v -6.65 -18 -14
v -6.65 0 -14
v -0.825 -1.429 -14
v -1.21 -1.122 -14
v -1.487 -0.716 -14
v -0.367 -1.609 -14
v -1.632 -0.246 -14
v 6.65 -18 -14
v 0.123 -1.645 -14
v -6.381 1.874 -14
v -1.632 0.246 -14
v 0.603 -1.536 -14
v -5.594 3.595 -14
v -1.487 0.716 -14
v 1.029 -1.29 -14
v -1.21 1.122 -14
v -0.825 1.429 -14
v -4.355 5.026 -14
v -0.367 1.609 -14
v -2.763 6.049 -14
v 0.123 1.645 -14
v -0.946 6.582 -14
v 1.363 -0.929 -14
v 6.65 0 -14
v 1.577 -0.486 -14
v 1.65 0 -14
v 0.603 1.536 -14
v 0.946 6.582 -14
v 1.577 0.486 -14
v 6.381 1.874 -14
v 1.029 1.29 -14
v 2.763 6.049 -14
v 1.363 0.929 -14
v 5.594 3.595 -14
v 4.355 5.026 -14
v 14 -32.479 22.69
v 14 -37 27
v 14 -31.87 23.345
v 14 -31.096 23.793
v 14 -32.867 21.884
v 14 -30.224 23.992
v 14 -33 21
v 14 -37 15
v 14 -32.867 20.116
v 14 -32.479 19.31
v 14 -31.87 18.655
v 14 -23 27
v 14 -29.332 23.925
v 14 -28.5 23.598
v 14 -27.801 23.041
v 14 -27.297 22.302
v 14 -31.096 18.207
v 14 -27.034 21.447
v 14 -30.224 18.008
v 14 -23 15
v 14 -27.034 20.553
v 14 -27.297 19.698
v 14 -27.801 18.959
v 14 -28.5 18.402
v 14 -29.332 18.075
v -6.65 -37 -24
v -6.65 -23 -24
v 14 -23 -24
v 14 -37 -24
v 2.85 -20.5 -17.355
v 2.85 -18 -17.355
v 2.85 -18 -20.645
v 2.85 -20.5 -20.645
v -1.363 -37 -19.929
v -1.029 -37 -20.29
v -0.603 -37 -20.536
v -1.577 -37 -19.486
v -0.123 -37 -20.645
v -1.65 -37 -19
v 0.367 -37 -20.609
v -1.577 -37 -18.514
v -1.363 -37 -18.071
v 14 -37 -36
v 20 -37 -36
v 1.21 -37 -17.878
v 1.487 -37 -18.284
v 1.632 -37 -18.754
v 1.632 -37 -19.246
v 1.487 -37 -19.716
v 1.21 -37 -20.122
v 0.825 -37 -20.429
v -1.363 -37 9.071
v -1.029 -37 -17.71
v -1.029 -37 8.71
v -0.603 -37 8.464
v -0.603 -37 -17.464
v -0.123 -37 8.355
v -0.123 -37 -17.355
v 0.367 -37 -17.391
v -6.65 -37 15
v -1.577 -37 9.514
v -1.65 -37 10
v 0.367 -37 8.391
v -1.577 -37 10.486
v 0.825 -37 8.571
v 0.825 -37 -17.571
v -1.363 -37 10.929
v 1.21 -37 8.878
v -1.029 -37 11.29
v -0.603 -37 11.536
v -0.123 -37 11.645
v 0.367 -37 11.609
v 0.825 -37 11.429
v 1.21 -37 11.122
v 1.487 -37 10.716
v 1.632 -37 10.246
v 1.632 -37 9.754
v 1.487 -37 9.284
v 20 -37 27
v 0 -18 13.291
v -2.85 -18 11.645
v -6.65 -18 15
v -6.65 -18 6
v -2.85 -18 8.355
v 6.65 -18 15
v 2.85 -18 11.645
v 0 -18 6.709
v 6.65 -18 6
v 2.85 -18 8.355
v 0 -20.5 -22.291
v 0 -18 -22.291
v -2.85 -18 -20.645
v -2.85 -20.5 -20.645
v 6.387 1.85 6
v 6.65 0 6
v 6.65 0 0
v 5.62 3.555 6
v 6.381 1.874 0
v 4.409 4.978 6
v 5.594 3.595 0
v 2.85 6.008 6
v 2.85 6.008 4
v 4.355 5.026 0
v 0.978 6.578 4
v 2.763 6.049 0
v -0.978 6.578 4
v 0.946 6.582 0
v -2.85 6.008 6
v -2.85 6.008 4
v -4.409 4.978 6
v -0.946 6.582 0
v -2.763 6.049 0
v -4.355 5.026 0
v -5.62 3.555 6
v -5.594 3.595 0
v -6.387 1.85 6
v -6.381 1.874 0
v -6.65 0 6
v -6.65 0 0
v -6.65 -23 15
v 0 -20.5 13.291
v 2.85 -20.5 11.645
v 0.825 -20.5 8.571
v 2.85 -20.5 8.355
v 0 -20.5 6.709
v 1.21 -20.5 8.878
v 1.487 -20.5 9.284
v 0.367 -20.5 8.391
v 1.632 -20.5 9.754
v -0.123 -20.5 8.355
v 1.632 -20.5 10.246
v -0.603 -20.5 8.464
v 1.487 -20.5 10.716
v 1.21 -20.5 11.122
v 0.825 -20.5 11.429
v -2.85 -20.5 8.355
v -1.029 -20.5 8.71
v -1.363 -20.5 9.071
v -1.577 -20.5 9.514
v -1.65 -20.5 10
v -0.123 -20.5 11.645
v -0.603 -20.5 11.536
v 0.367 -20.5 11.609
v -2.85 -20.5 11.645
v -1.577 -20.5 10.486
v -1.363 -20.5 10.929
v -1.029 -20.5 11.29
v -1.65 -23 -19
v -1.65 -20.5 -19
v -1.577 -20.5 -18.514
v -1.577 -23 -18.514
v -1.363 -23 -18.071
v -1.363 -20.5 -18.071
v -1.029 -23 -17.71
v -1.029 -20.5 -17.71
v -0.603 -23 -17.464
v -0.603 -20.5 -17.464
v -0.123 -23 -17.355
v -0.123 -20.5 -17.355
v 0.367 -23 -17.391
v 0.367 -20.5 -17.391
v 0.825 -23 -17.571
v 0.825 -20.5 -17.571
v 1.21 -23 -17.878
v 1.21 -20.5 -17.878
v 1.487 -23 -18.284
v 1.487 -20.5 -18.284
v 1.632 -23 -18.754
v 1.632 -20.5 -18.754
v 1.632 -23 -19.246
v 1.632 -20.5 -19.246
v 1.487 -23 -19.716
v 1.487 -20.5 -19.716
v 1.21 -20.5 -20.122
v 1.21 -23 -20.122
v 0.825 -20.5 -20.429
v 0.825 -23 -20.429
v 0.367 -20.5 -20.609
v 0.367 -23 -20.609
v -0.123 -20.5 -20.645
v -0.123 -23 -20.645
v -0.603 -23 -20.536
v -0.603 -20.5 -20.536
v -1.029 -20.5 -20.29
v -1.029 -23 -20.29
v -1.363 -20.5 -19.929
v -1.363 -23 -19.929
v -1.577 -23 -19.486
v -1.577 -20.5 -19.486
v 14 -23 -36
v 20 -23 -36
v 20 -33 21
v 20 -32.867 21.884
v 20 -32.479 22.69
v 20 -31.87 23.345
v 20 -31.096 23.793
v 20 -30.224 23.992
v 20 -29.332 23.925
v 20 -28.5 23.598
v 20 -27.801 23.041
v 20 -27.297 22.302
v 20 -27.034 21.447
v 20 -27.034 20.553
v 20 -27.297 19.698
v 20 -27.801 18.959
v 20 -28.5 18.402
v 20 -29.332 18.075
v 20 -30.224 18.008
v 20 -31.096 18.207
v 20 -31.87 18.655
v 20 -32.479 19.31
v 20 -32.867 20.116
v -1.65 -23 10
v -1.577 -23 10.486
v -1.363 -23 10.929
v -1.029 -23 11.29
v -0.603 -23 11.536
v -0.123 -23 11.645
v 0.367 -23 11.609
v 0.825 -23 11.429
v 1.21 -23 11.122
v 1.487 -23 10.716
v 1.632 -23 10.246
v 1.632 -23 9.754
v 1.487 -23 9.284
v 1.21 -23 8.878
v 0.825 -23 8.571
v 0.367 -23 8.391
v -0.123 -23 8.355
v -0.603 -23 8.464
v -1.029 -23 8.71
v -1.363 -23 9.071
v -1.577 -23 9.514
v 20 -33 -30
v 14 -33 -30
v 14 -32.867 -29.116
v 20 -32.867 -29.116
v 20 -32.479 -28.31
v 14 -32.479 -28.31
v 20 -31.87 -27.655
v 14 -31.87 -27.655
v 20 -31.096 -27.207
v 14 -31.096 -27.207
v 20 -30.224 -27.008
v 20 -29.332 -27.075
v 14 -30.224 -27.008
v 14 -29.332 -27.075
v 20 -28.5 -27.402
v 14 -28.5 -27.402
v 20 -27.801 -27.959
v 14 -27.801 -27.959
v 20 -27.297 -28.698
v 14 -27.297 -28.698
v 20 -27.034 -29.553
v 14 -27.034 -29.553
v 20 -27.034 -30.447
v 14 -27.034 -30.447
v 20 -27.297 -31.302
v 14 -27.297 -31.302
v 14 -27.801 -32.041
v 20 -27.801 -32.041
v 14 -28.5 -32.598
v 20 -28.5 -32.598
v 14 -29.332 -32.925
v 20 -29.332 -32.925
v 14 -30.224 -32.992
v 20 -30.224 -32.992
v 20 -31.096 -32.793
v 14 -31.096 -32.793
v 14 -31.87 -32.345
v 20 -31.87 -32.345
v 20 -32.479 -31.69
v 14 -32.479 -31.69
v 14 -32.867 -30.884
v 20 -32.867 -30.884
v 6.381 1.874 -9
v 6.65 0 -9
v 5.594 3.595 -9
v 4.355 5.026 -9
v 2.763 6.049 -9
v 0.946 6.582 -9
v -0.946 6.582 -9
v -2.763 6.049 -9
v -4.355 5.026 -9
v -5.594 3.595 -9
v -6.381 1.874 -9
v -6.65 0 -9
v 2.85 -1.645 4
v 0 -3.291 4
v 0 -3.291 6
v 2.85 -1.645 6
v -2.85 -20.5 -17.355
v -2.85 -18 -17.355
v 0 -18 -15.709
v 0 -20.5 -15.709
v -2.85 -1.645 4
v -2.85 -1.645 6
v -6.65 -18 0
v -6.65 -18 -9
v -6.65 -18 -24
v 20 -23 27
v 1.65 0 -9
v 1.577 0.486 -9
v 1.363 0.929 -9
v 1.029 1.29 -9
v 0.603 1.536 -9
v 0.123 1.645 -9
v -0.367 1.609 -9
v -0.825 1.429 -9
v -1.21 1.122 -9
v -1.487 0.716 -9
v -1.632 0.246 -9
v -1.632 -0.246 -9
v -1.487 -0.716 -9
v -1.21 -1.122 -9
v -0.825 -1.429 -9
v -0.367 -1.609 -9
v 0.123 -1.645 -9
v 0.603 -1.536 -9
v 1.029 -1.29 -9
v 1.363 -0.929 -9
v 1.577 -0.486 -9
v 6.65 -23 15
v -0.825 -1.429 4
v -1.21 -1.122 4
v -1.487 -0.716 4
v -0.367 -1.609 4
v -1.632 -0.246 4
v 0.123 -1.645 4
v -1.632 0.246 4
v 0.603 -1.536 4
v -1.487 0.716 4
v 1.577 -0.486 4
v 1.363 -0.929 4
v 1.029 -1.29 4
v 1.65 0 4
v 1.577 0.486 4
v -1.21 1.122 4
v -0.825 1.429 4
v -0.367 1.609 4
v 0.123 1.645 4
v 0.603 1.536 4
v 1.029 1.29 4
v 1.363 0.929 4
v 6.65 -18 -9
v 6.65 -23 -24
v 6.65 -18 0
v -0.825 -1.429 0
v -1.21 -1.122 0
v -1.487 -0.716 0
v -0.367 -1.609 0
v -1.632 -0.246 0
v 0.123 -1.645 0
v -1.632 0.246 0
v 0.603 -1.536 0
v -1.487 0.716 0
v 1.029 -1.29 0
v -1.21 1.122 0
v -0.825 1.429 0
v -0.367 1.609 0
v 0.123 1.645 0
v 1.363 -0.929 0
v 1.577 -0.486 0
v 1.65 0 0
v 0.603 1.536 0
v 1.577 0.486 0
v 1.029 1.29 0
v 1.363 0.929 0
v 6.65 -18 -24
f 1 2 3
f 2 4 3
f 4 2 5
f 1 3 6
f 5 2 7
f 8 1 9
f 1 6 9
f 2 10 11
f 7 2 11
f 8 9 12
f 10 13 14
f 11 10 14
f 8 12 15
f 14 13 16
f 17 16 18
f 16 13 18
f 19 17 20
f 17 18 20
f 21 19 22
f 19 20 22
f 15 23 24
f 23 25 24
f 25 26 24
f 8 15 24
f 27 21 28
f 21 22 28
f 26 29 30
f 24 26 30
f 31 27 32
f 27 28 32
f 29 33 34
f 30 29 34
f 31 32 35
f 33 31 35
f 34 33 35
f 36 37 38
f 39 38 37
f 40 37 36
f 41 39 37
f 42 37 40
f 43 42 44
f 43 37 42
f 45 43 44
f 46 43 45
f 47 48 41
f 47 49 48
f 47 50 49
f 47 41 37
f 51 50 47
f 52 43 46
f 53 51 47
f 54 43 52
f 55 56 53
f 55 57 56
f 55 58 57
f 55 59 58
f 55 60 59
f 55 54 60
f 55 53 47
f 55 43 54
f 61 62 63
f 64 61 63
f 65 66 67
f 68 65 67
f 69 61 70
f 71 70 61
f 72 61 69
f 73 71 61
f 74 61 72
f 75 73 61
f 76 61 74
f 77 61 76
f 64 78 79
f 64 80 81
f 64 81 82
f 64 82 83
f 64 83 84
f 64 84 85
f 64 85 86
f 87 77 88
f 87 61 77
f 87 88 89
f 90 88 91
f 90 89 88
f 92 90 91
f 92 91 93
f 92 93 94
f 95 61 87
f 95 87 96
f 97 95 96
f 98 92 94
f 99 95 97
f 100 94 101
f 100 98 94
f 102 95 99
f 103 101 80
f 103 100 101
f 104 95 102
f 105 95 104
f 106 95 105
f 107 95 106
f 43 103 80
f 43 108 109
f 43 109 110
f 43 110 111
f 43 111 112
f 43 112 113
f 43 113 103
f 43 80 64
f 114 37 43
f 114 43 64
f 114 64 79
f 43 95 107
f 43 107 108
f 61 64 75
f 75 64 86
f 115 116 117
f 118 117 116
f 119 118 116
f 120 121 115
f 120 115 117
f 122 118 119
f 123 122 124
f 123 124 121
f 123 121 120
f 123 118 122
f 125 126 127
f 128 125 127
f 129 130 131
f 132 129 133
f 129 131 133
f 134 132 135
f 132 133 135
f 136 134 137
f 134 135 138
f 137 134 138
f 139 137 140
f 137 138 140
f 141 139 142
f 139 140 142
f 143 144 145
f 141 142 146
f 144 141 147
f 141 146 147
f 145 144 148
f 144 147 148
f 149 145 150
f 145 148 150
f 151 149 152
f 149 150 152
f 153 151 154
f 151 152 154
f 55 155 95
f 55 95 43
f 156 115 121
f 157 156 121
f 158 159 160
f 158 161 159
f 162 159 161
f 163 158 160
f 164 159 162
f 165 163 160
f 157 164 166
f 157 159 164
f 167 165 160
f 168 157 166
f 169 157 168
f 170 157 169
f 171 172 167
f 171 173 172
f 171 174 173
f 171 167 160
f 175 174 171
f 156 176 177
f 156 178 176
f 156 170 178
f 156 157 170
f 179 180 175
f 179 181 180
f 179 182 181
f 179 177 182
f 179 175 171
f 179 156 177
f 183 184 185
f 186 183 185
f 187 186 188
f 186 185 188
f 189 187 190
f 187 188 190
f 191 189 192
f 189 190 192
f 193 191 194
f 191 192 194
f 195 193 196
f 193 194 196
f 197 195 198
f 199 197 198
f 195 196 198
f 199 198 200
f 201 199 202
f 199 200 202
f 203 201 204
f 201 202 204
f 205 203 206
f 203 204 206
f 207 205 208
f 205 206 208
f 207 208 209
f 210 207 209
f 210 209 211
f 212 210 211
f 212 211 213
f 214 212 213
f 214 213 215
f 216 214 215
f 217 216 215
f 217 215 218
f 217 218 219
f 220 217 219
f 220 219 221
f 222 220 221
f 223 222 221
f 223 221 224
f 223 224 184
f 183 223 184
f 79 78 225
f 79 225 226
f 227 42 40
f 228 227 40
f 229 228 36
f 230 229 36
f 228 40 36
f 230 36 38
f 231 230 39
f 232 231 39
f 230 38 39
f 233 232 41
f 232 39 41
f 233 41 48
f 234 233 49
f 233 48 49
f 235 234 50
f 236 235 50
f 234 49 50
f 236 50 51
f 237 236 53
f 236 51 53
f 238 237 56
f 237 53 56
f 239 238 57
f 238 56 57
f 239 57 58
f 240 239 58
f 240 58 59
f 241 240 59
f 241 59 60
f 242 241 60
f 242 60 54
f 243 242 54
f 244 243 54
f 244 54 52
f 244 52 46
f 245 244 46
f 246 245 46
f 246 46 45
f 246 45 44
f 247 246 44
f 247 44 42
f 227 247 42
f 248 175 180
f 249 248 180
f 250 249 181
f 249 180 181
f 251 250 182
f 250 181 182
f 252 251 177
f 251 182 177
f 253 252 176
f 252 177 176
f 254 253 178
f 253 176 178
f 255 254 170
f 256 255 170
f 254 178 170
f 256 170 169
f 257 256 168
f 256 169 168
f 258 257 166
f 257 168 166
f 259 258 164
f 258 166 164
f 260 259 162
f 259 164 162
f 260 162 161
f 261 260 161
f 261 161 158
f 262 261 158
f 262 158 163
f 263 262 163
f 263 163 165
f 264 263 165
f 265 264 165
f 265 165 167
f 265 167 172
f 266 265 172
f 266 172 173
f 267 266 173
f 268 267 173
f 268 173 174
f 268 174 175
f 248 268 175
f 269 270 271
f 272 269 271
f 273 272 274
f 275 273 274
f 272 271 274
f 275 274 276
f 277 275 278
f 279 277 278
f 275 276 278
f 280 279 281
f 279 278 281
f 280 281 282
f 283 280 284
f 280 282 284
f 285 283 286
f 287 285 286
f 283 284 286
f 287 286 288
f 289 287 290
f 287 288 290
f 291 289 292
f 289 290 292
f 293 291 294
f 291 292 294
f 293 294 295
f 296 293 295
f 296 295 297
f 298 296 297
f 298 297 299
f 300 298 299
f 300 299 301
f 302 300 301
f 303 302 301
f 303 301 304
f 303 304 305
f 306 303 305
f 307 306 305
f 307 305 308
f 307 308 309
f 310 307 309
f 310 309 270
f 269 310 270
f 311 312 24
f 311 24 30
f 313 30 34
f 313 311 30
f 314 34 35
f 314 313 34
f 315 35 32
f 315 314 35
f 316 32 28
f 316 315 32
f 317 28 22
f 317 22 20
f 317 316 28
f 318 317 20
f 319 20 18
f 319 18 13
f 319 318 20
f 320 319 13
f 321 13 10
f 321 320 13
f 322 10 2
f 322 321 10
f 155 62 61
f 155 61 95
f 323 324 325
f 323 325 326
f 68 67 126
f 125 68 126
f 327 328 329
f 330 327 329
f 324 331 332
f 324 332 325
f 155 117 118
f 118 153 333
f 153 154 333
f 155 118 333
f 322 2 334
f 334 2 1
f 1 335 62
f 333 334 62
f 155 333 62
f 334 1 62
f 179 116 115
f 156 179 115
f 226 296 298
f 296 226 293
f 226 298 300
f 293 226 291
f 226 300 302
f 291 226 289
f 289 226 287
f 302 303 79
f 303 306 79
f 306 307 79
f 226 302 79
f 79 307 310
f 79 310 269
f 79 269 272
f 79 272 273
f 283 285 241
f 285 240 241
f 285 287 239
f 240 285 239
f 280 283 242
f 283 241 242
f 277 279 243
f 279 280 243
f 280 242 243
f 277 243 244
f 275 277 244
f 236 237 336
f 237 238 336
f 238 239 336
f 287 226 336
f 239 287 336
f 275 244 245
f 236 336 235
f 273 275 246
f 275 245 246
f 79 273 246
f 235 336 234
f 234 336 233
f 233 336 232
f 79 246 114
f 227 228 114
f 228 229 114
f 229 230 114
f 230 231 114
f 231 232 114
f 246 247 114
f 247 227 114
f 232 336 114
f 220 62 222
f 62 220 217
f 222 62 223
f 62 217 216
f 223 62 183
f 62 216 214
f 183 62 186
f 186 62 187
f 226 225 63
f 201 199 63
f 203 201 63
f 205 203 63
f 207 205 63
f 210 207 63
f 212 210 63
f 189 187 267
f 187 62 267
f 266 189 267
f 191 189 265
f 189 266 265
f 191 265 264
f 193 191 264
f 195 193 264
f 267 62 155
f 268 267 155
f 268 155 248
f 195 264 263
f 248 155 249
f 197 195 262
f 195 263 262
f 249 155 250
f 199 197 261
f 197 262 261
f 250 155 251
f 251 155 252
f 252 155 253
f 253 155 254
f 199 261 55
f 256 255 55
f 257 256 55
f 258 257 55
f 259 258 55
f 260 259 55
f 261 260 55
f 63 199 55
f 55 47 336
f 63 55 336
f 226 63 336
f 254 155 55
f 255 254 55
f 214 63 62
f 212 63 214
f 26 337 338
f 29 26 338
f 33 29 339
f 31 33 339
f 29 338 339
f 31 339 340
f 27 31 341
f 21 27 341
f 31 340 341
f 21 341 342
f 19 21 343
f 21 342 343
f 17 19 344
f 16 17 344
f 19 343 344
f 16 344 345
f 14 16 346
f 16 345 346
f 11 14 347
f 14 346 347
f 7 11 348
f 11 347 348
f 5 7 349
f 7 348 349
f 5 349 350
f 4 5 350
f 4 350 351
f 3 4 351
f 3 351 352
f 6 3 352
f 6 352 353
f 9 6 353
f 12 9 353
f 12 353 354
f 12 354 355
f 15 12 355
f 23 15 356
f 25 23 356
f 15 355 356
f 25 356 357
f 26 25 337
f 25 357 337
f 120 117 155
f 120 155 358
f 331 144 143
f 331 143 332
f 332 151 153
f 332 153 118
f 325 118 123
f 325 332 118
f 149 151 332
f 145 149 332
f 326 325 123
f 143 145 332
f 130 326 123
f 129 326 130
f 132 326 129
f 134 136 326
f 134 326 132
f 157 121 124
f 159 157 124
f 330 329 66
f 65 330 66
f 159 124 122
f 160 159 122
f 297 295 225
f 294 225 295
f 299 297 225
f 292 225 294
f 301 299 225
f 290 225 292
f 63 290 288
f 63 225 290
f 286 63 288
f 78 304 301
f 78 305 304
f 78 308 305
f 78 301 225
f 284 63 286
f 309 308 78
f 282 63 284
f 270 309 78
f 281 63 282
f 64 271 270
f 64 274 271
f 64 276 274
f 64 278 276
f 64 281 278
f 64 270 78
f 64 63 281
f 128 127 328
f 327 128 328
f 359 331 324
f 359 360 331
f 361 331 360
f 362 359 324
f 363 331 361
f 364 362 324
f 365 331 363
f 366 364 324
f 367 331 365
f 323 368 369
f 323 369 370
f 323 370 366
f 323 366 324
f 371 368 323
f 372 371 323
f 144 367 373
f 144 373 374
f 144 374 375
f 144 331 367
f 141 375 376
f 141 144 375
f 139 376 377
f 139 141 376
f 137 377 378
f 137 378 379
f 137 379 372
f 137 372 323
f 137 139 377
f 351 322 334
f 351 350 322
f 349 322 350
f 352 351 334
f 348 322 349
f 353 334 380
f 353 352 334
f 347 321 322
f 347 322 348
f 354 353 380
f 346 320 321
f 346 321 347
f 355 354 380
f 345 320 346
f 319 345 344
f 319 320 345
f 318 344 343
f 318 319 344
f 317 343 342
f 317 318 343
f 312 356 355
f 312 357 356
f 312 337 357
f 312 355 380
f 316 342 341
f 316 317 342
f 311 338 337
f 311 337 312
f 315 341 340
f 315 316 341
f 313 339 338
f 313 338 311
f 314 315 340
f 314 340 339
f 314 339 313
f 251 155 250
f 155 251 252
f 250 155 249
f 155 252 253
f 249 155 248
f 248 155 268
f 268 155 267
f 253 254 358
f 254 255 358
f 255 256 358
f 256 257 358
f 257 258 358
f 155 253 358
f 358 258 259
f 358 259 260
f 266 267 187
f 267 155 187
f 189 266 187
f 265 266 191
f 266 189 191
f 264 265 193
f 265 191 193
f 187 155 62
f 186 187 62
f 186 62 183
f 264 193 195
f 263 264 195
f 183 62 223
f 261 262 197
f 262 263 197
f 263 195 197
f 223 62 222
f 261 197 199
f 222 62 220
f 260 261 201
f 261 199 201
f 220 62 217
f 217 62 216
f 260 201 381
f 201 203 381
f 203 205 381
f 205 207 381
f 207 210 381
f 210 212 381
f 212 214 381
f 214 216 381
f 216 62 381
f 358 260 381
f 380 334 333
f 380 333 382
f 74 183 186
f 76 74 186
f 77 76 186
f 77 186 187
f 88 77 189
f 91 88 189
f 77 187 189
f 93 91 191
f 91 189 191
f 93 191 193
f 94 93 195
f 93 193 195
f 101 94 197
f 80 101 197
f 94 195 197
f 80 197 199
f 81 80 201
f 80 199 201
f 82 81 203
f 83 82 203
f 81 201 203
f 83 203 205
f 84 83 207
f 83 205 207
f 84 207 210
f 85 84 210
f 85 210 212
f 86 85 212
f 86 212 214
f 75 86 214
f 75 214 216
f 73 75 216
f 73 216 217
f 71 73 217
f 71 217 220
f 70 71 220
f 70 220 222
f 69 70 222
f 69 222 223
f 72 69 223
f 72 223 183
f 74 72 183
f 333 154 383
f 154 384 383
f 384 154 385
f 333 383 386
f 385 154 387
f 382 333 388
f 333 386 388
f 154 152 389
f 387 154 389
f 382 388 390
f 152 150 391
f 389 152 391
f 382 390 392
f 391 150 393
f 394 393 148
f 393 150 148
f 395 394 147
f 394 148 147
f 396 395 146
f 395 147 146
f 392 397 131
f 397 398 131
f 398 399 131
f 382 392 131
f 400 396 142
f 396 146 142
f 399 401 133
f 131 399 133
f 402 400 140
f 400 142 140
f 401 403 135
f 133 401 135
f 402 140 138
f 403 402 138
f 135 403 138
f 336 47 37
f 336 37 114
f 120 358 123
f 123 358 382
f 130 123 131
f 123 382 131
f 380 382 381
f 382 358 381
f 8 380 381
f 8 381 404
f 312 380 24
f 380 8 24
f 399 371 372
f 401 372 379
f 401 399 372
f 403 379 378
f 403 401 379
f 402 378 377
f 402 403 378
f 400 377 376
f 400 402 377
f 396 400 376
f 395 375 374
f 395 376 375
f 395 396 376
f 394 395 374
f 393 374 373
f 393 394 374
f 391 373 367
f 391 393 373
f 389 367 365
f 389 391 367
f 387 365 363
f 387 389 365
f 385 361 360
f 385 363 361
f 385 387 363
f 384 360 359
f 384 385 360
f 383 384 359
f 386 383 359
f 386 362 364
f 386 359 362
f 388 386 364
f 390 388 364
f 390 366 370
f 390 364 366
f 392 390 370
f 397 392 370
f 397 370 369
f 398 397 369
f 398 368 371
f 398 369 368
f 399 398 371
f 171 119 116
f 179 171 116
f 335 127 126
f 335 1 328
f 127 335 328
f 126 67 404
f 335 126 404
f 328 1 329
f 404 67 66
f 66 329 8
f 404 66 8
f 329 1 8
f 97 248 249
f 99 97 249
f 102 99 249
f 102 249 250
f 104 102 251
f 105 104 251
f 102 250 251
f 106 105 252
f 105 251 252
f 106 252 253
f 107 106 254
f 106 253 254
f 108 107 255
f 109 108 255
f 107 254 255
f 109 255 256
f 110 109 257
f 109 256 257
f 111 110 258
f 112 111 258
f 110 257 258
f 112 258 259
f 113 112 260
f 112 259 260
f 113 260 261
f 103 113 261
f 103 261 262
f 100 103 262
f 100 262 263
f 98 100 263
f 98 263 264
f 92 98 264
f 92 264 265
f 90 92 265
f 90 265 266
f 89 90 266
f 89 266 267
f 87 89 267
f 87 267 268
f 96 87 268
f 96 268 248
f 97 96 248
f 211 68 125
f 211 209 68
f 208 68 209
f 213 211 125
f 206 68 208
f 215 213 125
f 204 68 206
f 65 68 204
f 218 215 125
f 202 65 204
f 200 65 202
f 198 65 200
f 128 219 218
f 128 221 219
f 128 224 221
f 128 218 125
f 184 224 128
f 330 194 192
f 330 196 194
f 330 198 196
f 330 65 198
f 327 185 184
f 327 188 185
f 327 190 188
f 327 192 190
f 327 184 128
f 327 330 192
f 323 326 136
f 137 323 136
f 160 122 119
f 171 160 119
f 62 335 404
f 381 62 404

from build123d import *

# Parameters (mm, degrees)
F0_W      = 13.3
F0_H      = 5
F0_R      = 1.65
F1_DEPTH  = 5
F2_DEPTH  = 15
F3_DEPTH  = 4.5
F6_R      = 1.65
F7_DEPTH  = 2.5
F8_DEPTH  = 25
F10_DEPTH = 1
F11_DEPTH = 1
F12_W     = 26.65
F12_H     = 39
F13_DEPTH = 14
F14_DEPTH = 25
F15_W     = 6
F15_H     = 14
F16_DEPTH = 12
F17_R     = 3
F18_DEPTH = 25
F19_W     = 6
F19_H     = 14
F20_DEPTH = 12
F21_R     = 3
F22_DEPTH = 25


with BuildPart() as f1:
    # F0 (on Top) → F1 (new body)
    with BuildSketch(Plane.XY):
        with Locations((0, -20.5)):
            Rectangle(F0_W, F0_H)
        with BuildLine():
            Line((6.65, -18), (6.65, 0))
            ThreePointArc((6.65, 0), (0, 6.65), (-6.65, 0))
            Line((-6.65, 0), (-6.65, -18))
            Line((-6.65, -18), (6.65, -18))
        make_face()
        Circle(F0_R, mode=Mode.SUBTRACT)
    extrude(amount=F1_DEPTH)

    # F0 (on Top) → F2 (join)
    with BuildSketch(Plane.XY):
        with Locations((0, -20.5)):
            Rectangle(F0_W, F0_H)
    extrude(amount=F2_DEPTH)

    # F0 (on Top) → F3 (join)
    with BuildSketch(Plane.XY):
        with Locations((0, -20.5)):
            Rectangle(F0_W, F0_H)
    extrude(amount=-F3_DEPTH)

    # F5: F1 across plane


with BuildPart() as f1_1:
    add(f1.part)
    add(f1.part.mirror(Plane(origin=(0, -20.5, -4.5), x_dir=(1, 0, 0), z_dir=(0, 0, -1))))

    # F6 (on face) → F7 (cut)
    with BuildSketch(Plane(origin=(0, -18, 0), x_dir=(-1, 0, 0), z_dir=(0, 1, 0))):
        Polygon((2.85, -20.6454482672), (2.85, -17.3545517328), (0, -15.7091034656), (-2.85, -17.3545517328), (-2.85, -20.6454482672), (0, -22.2908965344), align=None)
        with Locations((0, -19)):
            Circle(F6_R, mode=Mode.SUBTRACT)
        Polygon((-2.85, 8.3545517328), (0, 6.7091034656), (2.85, 8.3545517328), (2.85, 11.6454482672), (0, 13.2908965344), (-2.85, 11.6454482672), align=None)
        with Locations((0, 10)):
            Circle(F6_R, mode=Mode.SUBTRACT)
    extrude(amount=-F7_DEPTH, mode=Mode.SUBTRACT)

    # F8 (cut): faces of the model
    f8_faces = [f1_1.faces().sort_by_distance(p)[0] for p in [
        (0, -18, -19),
        (0, -18, 10),
    ]]
    extrude(f8_faces, amount=-F8_DEPTH, mode=Mode.SUBTRACT)

    # F9 (on face) → F10 (cut)
    with BuildSketch(Plane.XY.offset(5)):
        Polygon((2.85, -1.6454482672), (2.85, 1.6454482672), (0, 3.2908965344), (-2.85, 1.6454482672), (-2.85, -1.6454482672), (0, -3.2908965344), align=None)
        with BuildLine():
            Line((0, 3.2908965344), (2.85, 1.6454482672))
            Line((2.85, 1.6454482672), (2.85, 6.0083275543))
            ThreePointArc((2.85, 6.0083275543), (0, 6.65), (-2.85, 6.0083275543))
            Line((-2.85, 6.0083275543), (-2.85, 1.6454482672))
            Line((-2.85, 1.6454482672), (0, 3.2908965344))
        make_face()
    extrude(amount=-F10_DEPTH, mode=Mode.SUBTRACT)

    # F11 (add): a face of the model
    f11_faces = [f1_1.faces().sort_by_distance(p)[0] for p in [
        (0, -7.9774302241, 5),
    ]]
    extrude(f11_faces, amount=F11_DEPTH)


with BuildPart() as f13:
    # F12 (on face) → F13 (new body)
    with BuildSketch(Plane.XZ.offset(23)):
        with Locations((6.675, -4.5)):
            Rectangle(F12_W, F12_H)
    extrude(amount=F13_DEPTH)

    # F6 (on face) → F14 (cut)
    with BuildSketch(Plane(origin=(0, -18, 0), x_dir=(-1, 0, 0), z_dir=(0, 1, 0))):
        with Locations((0, -19)):
            Circle(F6_R)
        with Locations((0, 10)):
            Circle(F6_R)
    extrude(amount=-F14_DEPTH, mode=Mode.SUBTRACT)

    # F15 (on face) → F16 (join)
    with BuildSketch(Plane.XY.offset(15)):
        with Locations((17, -30)):
            Rectangle(F15_W, F15_H)
    extrude(amount=F16_DEPTH)

    # F17 (on face) → F18 (cut)
    with BuildSketch(Plane(origin=(14, 0, 0), x_dir=(0, -1, 0), z_dir=(-1, 0, 0))):
        with Locations((30, 21)):
            Circle(F17_R)
    extrude(amount=-F18_DEPTH, mode=Mode.SUBTRACT)

    # F19 (on face) → F20 (join)
    with BuildSketch(Plane(origin=(0, 0, -24), x_dir=(1, 0, 0), z_dir=(0, 0, -1))):
        with Locations((17, 30)):
            Rectangle(F19_W, F19_H)
    extrude(amount=F20_DEPTH)

    # F21 (on face) → F22 (cut)
    with BuildSketch(Plane(origin=(14, 0, 0), x_dir=(0, -1, 0), z_dir=(-1, 0, 0))):
        with Locations((30, -30)):
            Circle(F21_R)
    extrude(amount=-F22_DEPTH, mode=Mode.SUBTRACT)


solid = Compound([f1_1.part, f13.part])
